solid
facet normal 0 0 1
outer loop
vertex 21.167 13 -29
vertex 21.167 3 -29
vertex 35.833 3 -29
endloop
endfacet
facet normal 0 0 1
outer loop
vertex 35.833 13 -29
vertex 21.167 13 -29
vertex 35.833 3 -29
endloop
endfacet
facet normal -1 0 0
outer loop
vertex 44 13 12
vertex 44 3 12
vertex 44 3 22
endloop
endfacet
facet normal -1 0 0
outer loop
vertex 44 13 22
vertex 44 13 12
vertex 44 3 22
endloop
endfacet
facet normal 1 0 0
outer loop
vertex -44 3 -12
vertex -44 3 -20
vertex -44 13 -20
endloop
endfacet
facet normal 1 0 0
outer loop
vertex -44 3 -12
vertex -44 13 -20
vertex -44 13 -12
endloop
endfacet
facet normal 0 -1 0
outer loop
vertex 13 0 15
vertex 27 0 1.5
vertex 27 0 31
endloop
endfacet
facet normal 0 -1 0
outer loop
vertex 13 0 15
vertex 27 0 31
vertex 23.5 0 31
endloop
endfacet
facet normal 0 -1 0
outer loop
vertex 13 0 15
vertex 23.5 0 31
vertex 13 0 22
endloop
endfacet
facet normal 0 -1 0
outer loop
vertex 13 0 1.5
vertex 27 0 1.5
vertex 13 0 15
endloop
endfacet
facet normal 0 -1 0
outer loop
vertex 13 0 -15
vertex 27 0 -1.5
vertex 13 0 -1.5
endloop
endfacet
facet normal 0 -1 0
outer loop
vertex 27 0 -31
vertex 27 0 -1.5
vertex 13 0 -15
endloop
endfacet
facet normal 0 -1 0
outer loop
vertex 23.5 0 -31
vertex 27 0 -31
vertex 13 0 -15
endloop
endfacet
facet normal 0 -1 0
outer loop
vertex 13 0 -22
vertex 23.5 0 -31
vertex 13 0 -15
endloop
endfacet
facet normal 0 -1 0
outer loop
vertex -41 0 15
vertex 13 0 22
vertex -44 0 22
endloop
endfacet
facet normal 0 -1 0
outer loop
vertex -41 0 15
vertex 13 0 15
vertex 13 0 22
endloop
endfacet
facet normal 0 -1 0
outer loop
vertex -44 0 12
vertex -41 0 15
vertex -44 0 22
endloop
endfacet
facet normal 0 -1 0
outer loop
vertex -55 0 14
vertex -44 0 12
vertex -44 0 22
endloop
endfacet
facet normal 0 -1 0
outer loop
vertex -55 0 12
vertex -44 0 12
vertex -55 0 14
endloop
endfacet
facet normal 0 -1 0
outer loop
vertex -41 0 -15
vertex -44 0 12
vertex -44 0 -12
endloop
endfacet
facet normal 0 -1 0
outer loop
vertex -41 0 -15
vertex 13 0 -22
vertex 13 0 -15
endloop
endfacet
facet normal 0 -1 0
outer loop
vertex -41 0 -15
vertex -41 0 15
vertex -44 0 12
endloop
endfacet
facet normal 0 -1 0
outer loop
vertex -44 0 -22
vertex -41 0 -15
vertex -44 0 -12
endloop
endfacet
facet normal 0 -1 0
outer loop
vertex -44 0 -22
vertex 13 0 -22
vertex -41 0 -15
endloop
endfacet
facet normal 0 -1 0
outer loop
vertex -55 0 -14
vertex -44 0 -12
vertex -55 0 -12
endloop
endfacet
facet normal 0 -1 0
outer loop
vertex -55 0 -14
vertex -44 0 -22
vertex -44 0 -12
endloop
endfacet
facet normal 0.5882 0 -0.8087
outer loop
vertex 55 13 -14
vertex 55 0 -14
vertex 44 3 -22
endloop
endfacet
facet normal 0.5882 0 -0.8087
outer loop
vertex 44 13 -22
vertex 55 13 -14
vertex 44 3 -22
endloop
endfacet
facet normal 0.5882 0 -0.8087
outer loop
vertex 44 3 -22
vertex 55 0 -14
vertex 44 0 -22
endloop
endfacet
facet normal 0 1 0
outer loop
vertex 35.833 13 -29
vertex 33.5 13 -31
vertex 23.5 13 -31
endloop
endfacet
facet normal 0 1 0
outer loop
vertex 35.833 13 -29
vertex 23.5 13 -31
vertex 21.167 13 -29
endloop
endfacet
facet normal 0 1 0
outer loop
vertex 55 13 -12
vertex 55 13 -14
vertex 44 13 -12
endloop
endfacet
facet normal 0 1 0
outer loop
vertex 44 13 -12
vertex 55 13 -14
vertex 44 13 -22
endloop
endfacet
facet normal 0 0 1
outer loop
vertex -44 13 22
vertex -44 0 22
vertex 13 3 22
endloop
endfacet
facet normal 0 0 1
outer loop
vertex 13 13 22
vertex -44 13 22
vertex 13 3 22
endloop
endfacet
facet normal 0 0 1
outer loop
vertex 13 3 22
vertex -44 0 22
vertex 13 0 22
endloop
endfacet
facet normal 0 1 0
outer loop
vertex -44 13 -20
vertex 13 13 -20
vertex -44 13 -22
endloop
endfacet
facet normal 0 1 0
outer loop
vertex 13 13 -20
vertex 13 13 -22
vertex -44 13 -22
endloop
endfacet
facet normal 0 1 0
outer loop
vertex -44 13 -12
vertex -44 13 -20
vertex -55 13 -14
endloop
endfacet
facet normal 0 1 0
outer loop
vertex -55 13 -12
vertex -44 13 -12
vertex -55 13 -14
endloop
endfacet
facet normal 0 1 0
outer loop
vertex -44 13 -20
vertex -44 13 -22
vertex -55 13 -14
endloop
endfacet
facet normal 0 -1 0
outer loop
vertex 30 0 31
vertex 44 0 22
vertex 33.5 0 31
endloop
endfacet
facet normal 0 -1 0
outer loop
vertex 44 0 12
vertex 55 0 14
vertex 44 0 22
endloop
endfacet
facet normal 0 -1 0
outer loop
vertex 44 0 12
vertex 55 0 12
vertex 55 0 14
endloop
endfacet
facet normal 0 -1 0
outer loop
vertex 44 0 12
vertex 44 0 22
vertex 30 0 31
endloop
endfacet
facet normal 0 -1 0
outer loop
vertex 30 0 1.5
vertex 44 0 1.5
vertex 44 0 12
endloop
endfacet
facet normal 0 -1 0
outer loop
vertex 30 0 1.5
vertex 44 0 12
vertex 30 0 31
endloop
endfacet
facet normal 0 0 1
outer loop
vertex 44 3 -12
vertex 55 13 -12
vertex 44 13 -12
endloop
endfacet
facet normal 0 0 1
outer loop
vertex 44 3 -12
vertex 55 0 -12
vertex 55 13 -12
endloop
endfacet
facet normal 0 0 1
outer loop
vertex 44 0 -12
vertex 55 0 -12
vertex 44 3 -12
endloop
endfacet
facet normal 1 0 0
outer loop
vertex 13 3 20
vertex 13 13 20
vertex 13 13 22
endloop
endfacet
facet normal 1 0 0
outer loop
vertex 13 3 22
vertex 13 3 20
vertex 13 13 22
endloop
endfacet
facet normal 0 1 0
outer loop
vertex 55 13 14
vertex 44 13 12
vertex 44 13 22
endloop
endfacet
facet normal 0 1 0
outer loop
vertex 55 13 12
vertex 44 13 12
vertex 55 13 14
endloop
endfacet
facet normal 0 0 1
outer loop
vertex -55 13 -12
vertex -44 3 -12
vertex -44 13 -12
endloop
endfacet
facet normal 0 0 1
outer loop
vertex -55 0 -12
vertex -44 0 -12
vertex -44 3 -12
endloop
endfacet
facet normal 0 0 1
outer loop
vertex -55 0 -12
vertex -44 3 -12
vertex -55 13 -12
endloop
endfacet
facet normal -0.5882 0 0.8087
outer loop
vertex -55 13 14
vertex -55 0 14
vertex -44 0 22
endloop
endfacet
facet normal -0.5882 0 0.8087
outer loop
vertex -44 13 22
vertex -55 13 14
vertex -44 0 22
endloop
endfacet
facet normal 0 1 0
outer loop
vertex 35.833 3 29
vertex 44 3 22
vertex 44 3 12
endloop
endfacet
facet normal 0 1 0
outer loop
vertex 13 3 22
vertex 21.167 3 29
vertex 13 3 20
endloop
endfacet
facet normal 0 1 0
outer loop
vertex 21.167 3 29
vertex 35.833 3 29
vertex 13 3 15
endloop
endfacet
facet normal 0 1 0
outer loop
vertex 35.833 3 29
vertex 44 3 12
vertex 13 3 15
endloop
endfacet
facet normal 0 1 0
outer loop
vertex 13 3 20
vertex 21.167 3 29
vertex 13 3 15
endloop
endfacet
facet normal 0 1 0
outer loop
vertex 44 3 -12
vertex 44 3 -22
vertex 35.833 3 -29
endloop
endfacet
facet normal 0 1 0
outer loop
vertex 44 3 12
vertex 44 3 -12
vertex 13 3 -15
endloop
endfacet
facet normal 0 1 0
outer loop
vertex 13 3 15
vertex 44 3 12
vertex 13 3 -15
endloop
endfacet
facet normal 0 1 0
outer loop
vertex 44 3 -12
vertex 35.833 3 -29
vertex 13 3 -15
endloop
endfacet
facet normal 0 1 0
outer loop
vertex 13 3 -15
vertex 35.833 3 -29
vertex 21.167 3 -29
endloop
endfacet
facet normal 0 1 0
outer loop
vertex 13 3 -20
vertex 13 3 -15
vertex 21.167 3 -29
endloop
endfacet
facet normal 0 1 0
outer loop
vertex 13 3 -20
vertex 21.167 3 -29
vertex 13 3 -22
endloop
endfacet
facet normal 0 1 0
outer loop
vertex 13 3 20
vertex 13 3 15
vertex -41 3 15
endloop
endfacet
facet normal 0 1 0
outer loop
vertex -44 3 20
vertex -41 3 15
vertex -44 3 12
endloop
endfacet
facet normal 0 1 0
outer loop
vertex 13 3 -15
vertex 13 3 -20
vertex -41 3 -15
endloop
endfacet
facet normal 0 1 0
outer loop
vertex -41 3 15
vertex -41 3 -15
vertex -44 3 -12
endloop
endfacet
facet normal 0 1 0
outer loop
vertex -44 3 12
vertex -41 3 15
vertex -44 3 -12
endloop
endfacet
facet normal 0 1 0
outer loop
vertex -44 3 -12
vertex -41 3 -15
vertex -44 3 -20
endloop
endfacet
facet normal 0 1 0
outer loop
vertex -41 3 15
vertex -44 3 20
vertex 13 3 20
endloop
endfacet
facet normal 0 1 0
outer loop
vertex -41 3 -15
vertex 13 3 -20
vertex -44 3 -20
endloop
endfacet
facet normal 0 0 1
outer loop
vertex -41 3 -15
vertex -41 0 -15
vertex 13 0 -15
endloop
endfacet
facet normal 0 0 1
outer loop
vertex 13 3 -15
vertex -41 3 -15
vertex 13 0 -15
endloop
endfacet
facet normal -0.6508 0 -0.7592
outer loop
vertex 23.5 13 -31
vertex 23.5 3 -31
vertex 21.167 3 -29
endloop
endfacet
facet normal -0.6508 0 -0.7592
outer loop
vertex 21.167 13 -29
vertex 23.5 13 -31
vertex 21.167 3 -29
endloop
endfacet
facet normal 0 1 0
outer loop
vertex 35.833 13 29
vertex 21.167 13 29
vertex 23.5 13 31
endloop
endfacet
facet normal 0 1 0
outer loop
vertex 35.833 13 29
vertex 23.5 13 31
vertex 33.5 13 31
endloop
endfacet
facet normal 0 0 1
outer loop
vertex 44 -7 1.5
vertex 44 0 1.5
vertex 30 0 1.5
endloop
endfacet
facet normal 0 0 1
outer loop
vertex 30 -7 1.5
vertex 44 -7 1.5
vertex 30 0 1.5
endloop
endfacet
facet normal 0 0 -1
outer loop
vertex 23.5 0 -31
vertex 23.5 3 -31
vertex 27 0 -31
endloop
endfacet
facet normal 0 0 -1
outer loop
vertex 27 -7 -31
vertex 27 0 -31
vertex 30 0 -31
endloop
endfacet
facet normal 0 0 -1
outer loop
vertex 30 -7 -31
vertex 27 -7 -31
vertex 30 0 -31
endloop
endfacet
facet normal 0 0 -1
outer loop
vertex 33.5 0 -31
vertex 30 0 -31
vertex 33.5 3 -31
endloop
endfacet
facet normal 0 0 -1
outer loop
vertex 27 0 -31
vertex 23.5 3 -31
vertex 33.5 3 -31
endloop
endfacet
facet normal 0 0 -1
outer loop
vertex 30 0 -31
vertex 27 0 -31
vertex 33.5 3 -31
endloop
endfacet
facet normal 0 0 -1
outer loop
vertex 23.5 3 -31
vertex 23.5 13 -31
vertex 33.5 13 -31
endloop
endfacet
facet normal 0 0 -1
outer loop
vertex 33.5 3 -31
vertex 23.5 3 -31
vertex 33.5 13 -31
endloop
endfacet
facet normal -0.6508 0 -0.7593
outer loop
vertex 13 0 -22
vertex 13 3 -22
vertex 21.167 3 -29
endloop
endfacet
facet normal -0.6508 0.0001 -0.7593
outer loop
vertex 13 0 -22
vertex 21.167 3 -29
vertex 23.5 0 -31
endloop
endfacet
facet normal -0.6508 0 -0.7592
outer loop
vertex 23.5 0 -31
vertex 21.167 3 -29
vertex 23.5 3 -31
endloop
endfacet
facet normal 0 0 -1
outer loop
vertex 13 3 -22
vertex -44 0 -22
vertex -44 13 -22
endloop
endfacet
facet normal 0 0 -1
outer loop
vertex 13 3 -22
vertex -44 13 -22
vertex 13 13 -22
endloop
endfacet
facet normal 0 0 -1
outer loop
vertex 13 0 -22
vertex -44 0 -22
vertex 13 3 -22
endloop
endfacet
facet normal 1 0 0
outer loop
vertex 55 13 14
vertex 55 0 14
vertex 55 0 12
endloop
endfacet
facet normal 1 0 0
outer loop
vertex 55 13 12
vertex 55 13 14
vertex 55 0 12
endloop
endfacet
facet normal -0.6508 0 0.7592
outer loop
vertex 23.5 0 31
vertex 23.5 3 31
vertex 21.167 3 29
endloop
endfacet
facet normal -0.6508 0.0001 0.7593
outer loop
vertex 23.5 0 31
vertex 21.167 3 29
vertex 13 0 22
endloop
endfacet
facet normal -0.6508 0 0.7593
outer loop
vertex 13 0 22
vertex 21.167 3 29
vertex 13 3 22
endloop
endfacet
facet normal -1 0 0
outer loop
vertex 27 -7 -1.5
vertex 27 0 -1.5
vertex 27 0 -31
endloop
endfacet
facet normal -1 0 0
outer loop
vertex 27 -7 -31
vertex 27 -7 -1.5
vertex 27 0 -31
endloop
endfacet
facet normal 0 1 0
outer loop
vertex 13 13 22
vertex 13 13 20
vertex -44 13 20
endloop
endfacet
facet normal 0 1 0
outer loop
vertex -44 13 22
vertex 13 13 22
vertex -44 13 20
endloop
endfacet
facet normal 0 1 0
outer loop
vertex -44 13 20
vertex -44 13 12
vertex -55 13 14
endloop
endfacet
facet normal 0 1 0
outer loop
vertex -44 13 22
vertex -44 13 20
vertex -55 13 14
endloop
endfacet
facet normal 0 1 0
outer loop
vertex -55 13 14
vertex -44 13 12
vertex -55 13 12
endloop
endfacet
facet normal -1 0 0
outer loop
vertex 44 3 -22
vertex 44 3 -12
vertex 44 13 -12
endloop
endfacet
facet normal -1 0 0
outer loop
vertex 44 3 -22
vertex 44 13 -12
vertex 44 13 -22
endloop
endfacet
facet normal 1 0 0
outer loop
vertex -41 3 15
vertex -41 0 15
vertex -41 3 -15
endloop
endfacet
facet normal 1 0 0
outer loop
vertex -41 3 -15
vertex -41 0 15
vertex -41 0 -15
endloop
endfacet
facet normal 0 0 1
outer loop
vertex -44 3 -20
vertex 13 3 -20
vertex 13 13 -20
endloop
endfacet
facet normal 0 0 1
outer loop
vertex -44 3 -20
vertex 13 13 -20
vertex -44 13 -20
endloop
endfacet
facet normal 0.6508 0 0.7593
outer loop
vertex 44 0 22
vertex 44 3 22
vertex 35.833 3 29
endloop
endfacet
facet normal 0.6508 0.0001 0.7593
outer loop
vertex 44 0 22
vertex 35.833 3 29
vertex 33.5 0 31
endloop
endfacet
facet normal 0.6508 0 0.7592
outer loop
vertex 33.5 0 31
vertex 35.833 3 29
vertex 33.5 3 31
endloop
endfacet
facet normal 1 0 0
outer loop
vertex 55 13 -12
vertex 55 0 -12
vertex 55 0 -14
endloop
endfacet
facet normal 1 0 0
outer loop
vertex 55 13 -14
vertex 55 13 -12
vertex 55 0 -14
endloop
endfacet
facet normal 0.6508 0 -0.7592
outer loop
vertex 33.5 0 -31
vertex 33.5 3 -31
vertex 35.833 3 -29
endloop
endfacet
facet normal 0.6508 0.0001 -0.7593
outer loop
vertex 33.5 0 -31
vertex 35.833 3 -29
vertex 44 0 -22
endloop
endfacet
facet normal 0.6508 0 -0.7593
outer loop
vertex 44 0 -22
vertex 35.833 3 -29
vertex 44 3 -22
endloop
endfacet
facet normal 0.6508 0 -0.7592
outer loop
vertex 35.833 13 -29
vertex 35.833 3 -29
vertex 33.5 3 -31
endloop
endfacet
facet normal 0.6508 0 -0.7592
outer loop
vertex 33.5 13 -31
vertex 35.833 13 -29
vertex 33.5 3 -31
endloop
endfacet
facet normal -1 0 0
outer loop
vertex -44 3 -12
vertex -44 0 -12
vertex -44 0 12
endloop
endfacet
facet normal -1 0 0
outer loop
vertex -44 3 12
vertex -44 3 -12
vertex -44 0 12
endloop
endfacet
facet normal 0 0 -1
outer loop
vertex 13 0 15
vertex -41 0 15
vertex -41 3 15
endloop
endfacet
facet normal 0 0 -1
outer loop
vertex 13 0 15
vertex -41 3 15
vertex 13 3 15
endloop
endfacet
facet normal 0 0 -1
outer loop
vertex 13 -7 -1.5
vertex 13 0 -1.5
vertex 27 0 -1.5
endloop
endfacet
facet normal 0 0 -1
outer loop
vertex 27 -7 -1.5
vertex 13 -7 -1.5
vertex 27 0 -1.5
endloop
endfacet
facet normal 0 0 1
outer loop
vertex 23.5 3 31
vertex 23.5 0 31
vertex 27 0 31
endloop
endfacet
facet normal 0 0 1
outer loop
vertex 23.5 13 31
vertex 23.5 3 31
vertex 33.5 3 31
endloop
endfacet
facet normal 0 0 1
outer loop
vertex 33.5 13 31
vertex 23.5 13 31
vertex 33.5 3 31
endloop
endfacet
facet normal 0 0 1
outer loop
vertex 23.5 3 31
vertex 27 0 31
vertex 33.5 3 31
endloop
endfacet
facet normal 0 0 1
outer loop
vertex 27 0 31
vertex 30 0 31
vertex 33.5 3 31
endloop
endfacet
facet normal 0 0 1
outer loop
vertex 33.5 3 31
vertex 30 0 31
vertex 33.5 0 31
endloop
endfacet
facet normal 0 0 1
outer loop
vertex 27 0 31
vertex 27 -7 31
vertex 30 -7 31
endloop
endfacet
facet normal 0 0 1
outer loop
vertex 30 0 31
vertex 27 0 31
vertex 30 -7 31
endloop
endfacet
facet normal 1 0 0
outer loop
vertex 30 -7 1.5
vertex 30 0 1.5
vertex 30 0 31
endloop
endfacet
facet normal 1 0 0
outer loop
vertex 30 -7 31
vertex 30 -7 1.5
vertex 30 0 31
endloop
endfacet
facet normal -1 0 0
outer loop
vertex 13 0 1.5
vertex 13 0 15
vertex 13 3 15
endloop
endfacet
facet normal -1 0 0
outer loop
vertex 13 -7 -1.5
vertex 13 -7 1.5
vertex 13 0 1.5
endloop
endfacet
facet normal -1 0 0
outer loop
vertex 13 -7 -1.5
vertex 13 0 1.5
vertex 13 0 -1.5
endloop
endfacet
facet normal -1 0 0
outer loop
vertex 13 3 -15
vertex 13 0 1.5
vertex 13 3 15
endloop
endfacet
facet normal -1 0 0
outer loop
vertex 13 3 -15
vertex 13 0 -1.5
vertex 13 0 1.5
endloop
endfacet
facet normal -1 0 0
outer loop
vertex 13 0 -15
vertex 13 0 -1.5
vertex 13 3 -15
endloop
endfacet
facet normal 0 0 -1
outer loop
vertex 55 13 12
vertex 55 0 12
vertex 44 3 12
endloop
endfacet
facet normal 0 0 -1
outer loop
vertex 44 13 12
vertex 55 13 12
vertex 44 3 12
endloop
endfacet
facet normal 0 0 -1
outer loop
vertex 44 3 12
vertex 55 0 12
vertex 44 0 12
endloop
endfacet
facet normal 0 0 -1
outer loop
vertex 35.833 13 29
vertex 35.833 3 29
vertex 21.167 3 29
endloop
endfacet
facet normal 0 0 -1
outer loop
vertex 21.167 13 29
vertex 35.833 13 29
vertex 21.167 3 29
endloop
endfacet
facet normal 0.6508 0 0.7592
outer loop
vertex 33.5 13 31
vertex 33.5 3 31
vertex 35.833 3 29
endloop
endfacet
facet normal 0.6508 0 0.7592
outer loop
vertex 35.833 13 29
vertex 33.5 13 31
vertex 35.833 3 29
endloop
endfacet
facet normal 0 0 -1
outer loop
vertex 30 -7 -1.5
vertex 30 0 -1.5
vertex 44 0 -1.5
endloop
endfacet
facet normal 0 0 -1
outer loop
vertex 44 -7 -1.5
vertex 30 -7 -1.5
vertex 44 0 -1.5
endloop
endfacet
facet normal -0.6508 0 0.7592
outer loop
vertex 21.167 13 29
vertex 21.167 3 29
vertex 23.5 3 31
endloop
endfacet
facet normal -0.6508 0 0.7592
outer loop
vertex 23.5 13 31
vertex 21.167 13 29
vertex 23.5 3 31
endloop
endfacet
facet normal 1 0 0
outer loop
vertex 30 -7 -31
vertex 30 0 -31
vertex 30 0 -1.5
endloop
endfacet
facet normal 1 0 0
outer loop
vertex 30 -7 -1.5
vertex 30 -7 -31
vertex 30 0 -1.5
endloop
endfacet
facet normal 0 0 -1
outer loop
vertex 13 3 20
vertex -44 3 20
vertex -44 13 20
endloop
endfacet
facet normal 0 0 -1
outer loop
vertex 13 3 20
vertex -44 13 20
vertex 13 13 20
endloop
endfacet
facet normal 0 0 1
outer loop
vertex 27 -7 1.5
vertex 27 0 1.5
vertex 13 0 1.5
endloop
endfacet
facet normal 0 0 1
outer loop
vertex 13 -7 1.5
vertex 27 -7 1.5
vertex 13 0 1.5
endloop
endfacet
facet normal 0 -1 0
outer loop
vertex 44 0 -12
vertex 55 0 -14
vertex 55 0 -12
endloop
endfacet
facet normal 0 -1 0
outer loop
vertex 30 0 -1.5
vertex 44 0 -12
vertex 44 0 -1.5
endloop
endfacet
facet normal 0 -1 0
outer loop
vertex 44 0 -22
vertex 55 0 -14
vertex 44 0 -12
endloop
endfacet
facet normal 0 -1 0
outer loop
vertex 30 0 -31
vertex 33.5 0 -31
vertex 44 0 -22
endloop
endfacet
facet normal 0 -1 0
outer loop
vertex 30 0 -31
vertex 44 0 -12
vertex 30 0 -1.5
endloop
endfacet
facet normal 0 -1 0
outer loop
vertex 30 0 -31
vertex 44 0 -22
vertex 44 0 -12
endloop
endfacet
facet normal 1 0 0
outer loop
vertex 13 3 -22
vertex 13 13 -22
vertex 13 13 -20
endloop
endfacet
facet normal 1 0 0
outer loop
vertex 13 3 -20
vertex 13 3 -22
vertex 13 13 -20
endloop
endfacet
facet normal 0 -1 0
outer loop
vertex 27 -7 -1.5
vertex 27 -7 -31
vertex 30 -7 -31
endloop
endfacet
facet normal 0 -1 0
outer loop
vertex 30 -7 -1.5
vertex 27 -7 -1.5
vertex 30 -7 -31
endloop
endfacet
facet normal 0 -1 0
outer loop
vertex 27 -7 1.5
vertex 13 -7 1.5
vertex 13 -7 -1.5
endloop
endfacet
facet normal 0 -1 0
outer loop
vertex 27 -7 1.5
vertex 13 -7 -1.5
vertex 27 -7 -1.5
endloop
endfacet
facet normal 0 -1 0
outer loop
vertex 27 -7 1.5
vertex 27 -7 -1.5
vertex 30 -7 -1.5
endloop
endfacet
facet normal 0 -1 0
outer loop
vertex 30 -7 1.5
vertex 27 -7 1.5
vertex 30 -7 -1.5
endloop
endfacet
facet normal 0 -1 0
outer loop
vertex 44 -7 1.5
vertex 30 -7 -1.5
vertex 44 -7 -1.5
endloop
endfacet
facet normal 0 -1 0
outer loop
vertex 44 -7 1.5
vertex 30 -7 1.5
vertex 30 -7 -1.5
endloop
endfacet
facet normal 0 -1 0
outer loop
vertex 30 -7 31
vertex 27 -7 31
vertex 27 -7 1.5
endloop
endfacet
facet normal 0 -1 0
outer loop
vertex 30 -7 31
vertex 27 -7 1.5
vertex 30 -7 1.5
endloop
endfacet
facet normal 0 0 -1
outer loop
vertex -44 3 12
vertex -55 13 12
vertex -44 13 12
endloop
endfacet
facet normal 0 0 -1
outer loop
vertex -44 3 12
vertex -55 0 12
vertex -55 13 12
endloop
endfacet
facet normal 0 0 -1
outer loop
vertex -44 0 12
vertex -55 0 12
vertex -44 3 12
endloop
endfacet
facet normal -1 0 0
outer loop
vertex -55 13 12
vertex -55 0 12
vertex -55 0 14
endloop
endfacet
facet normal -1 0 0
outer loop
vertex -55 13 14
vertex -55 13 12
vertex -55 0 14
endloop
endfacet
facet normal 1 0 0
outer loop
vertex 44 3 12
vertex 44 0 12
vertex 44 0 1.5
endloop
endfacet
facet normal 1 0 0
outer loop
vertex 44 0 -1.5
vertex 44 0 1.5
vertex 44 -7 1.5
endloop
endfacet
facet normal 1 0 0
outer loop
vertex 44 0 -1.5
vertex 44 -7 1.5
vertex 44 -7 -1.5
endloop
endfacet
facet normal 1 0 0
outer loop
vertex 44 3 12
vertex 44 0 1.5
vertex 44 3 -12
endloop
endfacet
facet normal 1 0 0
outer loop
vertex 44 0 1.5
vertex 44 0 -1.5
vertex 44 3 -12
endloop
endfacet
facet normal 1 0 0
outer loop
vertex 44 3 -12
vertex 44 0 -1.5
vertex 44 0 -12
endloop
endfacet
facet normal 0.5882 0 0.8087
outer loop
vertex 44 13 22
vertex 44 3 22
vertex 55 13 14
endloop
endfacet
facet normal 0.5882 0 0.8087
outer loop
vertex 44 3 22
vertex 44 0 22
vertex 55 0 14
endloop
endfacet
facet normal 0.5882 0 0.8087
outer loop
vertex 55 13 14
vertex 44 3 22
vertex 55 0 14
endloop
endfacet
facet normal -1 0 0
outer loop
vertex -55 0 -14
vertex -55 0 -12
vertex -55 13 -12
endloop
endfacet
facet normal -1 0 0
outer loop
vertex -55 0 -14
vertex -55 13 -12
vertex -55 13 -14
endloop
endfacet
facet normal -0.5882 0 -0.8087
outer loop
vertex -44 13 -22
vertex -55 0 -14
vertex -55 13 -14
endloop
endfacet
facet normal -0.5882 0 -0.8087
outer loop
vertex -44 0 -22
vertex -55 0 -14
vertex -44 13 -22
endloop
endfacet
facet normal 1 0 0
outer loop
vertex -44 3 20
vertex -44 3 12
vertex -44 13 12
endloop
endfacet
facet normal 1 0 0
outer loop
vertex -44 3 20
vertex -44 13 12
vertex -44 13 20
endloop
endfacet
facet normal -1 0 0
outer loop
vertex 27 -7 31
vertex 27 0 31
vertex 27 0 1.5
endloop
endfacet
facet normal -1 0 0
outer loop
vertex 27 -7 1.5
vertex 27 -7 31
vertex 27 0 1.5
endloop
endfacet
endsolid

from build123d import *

# Parameters (mm, degrees)
SKETCH2_W           = 54
SKETCH2_H           = 30
BOSS_EXTRUDE1_DEPTH = 3
BOSS_EXTRUDE2_DEPTH = 10
BOSS_EXTRUDE4_DEPTH = 3
BOSS_EXTRUDE5_DEPTH = 10
BOSS_EXTRUDE3_DEPTH = 7


with BuildPart() as part:
    # Sketch2 → Boss-Extrude1 (new body)
    with BuildSketch(Plane(origin=(0, 0, 0), x_dir=(1, 0, 0), z_dir=(0, 1, 0))):
        Polygon((-55, 12), (-44, 12), (-44, -12), (-55, -12), (-55, -14), (-44, -22), (44, -22), (55, -14), (55, -12), (44, -12), (44, 12), (55, 12), (55, 14), (44, 22), (-44, 22), (-55, 14), align=None)
        with Locations((-14, 0)):
            Rectangle(SKETCH2_W, SKETCH2_H, mode=Mode.SUBTRACT)
    extrude(amount=BOSS_EXTRUDE1_DEPTH)

    # Sketch3 → Boss-Extrude2 (add)
    with BuildSketch(Plane(origin=(0, 3, 0), x_dir=(1, 0, 0), z_dir=(0, 1, 0))):
        Polygon((13, 20), (-44, 20), (-44, 12), (-55, 12), (-55, 14), (-44, 22), (13, 22), align=None)
        Polygon((-44, -12), (-44, -20), (13, -20), (13, -22), (-44, -22), (-55, -14), (-55, -12), align=None)
        Polygon((44, 12), (44, 22), (55, 14), (55, 12), align=None)
        Polygon((44, -22), (55, -14), (55, -12), (44, -12), align=None)
    extrude(amount=BOSS_EXTRUDE2_DEPTH)

    # Sketch5 → Boss-Extrude4 (add)
    with BuildSketch(Plane(origin=(0, 3, 0), x_dir=(1, 0, 0), z_dir=(0, 1, 0))):
        Polygon((13, -22), (44, -22), (33.5, -31), (23.5, -31), align=None)
        Polygon((44, 22), (13, 22), (23.5, 31), (33.5, 31), align=None)
    extrude(amount=-BOSS_EXTRUDE4_DEPTH)

    # Sketch6 → Boss-Extrude5 (add)
    with BuildSketch(Plane(origin=(0, 3, 0), x_dir=(1, 0, 0), z_dir=(0, 1, 0))):
        Polygon((21.166666667, -29), (23.5, -31), (33.5, -31), (35.833333333, -29), align=None)
        Polygon((35.833333333, 29), (33.5, 31), (23.5, 31), (21.166666667, 29), align=None)
    extrude(amount=BOSS_EXTRUDE5_DEPTH)

    # Sketch4 → Boss-Extrude3 (add)
    with BuildSketch(Plane.XZ):
        Polygon((13, 1.5), (13, -1.5), (27, -1.5), (27, -31), (30, -31), (30, -1.5), (44, -1.5), (44, 1.5), (30, 1.5), (30, 31), (27, 31), (27, 1.5), align=None)
    extrude(amount=BOSS_EXTRUDE3_DEPTH)


solid = part.part
